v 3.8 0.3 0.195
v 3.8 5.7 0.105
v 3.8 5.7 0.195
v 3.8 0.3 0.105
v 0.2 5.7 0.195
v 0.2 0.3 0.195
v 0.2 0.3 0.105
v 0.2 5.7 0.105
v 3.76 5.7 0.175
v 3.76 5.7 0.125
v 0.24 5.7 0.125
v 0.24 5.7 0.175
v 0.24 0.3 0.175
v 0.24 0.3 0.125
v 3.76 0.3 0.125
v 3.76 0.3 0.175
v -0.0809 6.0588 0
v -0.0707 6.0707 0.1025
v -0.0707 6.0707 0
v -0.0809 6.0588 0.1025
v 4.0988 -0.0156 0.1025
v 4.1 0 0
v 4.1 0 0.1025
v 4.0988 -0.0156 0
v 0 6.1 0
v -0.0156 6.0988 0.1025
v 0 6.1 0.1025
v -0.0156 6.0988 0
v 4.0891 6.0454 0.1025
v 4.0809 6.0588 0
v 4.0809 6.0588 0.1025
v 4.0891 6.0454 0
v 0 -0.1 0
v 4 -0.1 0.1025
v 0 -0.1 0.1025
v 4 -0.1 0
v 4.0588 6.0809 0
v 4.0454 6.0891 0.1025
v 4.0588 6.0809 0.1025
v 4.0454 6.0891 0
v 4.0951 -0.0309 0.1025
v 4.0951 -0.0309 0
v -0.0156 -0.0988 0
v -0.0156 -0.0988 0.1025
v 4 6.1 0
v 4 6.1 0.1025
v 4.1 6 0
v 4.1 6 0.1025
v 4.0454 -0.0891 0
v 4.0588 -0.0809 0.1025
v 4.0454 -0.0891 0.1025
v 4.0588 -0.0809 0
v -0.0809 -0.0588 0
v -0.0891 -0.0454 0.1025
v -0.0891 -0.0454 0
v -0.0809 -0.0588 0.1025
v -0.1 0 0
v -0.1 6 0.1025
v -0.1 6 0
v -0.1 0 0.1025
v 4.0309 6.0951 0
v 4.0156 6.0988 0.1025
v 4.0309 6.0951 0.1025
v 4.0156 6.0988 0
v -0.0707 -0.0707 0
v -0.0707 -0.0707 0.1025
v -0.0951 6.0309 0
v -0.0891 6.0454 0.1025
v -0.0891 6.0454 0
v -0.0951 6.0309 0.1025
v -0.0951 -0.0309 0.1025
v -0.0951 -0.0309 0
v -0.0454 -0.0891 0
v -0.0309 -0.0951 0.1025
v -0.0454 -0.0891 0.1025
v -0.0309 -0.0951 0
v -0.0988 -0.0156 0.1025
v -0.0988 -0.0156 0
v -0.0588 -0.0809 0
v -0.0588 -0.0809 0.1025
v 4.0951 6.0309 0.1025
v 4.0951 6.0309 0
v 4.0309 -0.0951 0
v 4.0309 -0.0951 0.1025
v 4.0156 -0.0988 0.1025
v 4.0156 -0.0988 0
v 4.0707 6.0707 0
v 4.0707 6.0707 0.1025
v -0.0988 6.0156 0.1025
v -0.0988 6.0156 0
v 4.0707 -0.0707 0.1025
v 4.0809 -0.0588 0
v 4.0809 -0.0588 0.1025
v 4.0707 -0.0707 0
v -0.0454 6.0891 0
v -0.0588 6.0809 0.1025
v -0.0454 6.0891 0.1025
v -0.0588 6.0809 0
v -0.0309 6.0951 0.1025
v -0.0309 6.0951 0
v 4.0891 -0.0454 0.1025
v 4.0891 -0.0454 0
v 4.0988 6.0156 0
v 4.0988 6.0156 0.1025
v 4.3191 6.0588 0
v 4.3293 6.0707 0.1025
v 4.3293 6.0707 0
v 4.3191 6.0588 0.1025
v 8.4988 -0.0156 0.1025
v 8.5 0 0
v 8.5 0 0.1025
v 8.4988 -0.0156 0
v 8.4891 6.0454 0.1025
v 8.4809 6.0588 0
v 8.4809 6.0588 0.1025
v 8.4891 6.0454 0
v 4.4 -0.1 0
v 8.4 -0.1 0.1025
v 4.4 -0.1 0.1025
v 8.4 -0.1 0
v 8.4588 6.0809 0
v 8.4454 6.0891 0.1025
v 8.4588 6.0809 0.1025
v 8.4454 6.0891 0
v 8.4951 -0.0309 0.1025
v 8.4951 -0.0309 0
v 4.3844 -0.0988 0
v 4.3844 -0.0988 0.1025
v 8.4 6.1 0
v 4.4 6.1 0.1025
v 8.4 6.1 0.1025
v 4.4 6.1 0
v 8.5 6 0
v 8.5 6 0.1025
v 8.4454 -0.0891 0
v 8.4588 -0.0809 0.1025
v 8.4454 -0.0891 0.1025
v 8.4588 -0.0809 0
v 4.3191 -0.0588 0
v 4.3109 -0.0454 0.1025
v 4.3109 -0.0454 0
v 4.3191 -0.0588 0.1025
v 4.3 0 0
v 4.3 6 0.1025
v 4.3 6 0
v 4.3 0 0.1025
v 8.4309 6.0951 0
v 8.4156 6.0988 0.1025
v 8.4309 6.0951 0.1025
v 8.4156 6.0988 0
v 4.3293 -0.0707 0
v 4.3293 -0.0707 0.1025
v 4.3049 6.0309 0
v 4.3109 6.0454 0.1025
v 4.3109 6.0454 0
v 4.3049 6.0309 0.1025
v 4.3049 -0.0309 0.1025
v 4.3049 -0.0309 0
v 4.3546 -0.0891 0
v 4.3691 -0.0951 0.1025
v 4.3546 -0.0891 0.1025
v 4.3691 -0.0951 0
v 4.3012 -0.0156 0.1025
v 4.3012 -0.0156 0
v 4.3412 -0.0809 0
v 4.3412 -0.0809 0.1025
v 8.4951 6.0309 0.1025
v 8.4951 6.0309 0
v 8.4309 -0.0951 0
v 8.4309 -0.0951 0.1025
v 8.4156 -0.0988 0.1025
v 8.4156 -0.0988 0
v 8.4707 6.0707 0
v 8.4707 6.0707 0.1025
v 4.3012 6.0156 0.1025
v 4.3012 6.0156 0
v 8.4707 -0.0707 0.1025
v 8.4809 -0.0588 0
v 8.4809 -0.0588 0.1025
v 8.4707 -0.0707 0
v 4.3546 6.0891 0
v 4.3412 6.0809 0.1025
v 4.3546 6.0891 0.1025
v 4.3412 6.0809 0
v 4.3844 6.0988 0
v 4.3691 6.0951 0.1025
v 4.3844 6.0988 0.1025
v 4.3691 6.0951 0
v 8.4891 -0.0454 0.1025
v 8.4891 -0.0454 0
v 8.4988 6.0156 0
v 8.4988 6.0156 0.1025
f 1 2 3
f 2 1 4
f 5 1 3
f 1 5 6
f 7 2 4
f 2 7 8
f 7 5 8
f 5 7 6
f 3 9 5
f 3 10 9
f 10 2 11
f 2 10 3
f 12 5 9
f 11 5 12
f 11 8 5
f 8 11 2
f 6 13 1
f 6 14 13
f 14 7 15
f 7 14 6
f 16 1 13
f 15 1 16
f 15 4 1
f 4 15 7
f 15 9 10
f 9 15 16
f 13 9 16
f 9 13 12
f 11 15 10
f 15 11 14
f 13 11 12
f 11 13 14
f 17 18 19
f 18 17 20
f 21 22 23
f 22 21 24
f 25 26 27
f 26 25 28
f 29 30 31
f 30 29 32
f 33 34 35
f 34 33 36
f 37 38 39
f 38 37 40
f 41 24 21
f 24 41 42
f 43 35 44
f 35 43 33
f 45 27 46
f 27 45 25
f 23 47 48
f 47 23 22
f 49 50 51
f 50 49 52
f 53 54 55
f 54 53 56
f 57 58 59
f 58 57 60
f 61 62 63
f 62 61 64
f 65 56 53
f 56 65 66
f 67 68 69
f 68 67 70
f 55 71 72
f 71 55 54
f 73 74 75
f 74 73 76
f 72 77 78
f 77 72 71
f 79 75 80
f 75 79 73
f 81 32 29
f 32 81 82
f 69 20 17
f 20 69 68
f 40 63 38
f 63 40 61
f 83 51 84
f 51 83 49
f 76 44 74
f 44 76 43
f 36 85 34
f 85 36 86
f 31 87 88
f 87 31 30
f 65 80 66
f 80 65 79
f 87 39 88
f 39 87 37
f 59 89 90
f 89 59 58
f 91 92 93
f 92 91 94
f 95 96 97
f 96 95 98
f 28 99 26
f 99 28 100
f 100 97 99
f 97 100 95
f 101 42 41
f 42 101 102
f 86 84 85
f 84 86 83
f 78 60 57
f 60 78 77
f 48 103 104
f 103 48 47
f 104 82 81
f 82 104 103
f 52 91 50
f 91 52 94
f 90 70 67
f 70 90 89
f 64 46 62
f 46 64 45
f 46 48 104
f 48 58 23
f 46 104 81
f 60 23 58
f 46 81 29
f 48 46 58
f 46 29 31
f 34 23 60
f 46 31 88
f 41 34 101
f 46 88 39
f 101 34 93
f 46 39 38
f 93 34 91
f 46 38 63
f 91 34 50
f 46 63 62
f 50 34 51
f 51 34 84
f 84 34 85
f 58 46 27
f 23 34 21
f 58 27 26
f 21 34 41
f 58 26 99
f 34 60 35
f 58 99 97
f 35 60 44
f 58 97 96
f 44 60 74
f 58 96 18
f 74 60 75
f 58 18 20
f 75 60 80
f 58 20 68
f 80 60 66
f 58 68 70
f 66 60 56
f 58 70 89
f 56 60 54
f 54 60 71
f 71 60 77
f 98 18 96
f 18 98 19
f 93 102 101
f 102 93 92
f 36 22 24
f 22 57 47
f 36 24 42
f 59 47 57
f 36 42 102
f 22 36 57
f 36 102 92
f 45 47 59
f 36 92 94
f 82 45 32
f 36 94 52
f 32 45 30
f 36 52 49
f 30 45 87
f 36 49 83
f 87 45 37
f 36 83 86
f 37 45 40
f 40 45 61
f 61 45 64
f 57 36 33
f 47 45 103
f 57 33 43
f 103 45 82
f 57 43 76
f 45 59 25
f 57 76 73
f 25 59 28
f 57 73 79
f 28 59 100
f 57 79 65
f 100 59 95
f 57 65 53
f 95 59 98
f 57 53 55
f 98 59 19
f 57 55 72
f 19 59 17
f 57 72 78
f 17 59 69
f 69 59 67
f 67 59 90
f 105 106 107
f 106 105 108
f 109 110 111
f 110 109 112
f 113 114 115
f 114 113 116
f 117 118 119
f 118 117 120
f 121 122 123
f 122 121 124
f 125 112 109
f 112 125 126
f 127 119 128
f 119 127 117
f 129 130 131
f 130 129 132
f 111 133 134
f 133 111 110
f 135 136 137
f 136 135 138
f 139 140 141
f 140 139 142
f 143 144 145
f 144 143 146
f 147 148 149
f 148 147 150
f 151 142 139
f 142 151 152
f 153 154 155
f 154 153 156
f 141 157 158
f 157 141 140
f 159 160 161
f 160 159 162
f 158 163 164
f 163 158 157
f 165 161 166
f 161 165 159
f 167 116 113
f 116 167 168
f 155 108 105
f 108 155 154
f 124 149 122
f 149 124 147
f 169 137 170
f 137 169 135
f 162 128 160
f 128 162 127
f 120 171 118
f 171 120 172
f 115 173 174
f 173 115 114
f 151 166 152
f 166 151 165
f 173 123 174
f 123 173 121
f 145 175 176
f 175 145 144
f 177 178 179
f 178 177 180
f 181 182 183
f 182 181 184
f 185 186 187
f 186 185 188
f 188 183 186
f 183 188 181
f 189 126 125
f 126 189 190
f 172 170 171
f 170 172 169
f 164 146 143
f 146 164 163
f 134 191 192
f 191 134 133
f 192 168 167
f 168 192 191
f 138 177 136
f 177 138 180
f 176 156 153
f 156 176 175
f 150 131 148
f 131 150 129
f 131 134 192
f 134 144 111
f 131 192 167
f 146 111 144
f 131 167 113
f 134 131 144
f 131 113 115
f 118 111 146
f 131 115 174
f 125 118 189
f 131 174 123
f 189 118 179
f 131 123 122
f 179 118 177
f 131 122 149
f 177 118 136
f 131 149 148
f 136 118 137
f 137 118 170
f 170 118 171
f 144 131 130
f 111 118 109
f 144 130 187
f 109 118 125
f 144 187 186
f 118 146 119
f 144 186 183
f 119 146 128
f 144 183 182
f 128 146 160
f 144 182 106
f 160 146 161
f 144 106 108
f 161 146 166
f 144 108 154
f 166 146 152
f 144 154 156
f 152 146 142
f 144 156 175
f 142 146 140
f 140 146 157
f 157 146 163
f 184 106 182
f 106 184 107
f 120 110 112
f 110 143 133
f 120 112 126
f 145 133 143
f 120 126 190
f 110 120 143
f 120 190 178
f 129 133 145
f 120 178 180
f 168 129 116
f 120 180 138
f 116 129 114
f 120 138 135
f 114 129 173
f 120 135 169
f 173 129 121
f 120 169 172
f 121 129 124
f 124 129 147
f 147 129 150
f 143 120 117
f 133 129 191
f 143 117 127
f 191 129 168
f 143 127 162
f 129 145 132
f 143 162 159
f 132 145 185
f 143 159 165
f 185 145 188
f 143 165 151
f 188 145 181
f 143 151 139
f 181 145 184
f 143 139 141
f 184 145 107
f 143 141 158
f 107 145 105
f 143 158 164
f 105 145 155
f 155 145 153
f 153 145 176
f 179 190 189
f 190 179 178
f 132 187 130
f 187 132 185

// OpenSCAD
/**
 * @author Robotia
 * @brief 3.5x5.5 inch Memo Pad Cover & Holder
 */
dims = [4, 6, 0.1];

// Bottom
minkowski() {
    cube(dims);
    cylinder(r=dims[0]/40, h=dims[2]/40, $fn=40);
}

// Top
translate([dims[0] + dims[0]/10, 0, 0]) {
    minkowski() {
        cube(dims);
        cylinder(r=dims[0]/40, h=dims[2]/40, $fn=40);
    }
}


translate([dims[0]/2, dims[1]/2, dims[2] * 1.5]) {
    difference() {
        cube(dims * 0.9, center=true);
        cube([dims[0] * 0.88, dims[1] * 0.9, dims[2] * 0.5], center=true);
    }
}
